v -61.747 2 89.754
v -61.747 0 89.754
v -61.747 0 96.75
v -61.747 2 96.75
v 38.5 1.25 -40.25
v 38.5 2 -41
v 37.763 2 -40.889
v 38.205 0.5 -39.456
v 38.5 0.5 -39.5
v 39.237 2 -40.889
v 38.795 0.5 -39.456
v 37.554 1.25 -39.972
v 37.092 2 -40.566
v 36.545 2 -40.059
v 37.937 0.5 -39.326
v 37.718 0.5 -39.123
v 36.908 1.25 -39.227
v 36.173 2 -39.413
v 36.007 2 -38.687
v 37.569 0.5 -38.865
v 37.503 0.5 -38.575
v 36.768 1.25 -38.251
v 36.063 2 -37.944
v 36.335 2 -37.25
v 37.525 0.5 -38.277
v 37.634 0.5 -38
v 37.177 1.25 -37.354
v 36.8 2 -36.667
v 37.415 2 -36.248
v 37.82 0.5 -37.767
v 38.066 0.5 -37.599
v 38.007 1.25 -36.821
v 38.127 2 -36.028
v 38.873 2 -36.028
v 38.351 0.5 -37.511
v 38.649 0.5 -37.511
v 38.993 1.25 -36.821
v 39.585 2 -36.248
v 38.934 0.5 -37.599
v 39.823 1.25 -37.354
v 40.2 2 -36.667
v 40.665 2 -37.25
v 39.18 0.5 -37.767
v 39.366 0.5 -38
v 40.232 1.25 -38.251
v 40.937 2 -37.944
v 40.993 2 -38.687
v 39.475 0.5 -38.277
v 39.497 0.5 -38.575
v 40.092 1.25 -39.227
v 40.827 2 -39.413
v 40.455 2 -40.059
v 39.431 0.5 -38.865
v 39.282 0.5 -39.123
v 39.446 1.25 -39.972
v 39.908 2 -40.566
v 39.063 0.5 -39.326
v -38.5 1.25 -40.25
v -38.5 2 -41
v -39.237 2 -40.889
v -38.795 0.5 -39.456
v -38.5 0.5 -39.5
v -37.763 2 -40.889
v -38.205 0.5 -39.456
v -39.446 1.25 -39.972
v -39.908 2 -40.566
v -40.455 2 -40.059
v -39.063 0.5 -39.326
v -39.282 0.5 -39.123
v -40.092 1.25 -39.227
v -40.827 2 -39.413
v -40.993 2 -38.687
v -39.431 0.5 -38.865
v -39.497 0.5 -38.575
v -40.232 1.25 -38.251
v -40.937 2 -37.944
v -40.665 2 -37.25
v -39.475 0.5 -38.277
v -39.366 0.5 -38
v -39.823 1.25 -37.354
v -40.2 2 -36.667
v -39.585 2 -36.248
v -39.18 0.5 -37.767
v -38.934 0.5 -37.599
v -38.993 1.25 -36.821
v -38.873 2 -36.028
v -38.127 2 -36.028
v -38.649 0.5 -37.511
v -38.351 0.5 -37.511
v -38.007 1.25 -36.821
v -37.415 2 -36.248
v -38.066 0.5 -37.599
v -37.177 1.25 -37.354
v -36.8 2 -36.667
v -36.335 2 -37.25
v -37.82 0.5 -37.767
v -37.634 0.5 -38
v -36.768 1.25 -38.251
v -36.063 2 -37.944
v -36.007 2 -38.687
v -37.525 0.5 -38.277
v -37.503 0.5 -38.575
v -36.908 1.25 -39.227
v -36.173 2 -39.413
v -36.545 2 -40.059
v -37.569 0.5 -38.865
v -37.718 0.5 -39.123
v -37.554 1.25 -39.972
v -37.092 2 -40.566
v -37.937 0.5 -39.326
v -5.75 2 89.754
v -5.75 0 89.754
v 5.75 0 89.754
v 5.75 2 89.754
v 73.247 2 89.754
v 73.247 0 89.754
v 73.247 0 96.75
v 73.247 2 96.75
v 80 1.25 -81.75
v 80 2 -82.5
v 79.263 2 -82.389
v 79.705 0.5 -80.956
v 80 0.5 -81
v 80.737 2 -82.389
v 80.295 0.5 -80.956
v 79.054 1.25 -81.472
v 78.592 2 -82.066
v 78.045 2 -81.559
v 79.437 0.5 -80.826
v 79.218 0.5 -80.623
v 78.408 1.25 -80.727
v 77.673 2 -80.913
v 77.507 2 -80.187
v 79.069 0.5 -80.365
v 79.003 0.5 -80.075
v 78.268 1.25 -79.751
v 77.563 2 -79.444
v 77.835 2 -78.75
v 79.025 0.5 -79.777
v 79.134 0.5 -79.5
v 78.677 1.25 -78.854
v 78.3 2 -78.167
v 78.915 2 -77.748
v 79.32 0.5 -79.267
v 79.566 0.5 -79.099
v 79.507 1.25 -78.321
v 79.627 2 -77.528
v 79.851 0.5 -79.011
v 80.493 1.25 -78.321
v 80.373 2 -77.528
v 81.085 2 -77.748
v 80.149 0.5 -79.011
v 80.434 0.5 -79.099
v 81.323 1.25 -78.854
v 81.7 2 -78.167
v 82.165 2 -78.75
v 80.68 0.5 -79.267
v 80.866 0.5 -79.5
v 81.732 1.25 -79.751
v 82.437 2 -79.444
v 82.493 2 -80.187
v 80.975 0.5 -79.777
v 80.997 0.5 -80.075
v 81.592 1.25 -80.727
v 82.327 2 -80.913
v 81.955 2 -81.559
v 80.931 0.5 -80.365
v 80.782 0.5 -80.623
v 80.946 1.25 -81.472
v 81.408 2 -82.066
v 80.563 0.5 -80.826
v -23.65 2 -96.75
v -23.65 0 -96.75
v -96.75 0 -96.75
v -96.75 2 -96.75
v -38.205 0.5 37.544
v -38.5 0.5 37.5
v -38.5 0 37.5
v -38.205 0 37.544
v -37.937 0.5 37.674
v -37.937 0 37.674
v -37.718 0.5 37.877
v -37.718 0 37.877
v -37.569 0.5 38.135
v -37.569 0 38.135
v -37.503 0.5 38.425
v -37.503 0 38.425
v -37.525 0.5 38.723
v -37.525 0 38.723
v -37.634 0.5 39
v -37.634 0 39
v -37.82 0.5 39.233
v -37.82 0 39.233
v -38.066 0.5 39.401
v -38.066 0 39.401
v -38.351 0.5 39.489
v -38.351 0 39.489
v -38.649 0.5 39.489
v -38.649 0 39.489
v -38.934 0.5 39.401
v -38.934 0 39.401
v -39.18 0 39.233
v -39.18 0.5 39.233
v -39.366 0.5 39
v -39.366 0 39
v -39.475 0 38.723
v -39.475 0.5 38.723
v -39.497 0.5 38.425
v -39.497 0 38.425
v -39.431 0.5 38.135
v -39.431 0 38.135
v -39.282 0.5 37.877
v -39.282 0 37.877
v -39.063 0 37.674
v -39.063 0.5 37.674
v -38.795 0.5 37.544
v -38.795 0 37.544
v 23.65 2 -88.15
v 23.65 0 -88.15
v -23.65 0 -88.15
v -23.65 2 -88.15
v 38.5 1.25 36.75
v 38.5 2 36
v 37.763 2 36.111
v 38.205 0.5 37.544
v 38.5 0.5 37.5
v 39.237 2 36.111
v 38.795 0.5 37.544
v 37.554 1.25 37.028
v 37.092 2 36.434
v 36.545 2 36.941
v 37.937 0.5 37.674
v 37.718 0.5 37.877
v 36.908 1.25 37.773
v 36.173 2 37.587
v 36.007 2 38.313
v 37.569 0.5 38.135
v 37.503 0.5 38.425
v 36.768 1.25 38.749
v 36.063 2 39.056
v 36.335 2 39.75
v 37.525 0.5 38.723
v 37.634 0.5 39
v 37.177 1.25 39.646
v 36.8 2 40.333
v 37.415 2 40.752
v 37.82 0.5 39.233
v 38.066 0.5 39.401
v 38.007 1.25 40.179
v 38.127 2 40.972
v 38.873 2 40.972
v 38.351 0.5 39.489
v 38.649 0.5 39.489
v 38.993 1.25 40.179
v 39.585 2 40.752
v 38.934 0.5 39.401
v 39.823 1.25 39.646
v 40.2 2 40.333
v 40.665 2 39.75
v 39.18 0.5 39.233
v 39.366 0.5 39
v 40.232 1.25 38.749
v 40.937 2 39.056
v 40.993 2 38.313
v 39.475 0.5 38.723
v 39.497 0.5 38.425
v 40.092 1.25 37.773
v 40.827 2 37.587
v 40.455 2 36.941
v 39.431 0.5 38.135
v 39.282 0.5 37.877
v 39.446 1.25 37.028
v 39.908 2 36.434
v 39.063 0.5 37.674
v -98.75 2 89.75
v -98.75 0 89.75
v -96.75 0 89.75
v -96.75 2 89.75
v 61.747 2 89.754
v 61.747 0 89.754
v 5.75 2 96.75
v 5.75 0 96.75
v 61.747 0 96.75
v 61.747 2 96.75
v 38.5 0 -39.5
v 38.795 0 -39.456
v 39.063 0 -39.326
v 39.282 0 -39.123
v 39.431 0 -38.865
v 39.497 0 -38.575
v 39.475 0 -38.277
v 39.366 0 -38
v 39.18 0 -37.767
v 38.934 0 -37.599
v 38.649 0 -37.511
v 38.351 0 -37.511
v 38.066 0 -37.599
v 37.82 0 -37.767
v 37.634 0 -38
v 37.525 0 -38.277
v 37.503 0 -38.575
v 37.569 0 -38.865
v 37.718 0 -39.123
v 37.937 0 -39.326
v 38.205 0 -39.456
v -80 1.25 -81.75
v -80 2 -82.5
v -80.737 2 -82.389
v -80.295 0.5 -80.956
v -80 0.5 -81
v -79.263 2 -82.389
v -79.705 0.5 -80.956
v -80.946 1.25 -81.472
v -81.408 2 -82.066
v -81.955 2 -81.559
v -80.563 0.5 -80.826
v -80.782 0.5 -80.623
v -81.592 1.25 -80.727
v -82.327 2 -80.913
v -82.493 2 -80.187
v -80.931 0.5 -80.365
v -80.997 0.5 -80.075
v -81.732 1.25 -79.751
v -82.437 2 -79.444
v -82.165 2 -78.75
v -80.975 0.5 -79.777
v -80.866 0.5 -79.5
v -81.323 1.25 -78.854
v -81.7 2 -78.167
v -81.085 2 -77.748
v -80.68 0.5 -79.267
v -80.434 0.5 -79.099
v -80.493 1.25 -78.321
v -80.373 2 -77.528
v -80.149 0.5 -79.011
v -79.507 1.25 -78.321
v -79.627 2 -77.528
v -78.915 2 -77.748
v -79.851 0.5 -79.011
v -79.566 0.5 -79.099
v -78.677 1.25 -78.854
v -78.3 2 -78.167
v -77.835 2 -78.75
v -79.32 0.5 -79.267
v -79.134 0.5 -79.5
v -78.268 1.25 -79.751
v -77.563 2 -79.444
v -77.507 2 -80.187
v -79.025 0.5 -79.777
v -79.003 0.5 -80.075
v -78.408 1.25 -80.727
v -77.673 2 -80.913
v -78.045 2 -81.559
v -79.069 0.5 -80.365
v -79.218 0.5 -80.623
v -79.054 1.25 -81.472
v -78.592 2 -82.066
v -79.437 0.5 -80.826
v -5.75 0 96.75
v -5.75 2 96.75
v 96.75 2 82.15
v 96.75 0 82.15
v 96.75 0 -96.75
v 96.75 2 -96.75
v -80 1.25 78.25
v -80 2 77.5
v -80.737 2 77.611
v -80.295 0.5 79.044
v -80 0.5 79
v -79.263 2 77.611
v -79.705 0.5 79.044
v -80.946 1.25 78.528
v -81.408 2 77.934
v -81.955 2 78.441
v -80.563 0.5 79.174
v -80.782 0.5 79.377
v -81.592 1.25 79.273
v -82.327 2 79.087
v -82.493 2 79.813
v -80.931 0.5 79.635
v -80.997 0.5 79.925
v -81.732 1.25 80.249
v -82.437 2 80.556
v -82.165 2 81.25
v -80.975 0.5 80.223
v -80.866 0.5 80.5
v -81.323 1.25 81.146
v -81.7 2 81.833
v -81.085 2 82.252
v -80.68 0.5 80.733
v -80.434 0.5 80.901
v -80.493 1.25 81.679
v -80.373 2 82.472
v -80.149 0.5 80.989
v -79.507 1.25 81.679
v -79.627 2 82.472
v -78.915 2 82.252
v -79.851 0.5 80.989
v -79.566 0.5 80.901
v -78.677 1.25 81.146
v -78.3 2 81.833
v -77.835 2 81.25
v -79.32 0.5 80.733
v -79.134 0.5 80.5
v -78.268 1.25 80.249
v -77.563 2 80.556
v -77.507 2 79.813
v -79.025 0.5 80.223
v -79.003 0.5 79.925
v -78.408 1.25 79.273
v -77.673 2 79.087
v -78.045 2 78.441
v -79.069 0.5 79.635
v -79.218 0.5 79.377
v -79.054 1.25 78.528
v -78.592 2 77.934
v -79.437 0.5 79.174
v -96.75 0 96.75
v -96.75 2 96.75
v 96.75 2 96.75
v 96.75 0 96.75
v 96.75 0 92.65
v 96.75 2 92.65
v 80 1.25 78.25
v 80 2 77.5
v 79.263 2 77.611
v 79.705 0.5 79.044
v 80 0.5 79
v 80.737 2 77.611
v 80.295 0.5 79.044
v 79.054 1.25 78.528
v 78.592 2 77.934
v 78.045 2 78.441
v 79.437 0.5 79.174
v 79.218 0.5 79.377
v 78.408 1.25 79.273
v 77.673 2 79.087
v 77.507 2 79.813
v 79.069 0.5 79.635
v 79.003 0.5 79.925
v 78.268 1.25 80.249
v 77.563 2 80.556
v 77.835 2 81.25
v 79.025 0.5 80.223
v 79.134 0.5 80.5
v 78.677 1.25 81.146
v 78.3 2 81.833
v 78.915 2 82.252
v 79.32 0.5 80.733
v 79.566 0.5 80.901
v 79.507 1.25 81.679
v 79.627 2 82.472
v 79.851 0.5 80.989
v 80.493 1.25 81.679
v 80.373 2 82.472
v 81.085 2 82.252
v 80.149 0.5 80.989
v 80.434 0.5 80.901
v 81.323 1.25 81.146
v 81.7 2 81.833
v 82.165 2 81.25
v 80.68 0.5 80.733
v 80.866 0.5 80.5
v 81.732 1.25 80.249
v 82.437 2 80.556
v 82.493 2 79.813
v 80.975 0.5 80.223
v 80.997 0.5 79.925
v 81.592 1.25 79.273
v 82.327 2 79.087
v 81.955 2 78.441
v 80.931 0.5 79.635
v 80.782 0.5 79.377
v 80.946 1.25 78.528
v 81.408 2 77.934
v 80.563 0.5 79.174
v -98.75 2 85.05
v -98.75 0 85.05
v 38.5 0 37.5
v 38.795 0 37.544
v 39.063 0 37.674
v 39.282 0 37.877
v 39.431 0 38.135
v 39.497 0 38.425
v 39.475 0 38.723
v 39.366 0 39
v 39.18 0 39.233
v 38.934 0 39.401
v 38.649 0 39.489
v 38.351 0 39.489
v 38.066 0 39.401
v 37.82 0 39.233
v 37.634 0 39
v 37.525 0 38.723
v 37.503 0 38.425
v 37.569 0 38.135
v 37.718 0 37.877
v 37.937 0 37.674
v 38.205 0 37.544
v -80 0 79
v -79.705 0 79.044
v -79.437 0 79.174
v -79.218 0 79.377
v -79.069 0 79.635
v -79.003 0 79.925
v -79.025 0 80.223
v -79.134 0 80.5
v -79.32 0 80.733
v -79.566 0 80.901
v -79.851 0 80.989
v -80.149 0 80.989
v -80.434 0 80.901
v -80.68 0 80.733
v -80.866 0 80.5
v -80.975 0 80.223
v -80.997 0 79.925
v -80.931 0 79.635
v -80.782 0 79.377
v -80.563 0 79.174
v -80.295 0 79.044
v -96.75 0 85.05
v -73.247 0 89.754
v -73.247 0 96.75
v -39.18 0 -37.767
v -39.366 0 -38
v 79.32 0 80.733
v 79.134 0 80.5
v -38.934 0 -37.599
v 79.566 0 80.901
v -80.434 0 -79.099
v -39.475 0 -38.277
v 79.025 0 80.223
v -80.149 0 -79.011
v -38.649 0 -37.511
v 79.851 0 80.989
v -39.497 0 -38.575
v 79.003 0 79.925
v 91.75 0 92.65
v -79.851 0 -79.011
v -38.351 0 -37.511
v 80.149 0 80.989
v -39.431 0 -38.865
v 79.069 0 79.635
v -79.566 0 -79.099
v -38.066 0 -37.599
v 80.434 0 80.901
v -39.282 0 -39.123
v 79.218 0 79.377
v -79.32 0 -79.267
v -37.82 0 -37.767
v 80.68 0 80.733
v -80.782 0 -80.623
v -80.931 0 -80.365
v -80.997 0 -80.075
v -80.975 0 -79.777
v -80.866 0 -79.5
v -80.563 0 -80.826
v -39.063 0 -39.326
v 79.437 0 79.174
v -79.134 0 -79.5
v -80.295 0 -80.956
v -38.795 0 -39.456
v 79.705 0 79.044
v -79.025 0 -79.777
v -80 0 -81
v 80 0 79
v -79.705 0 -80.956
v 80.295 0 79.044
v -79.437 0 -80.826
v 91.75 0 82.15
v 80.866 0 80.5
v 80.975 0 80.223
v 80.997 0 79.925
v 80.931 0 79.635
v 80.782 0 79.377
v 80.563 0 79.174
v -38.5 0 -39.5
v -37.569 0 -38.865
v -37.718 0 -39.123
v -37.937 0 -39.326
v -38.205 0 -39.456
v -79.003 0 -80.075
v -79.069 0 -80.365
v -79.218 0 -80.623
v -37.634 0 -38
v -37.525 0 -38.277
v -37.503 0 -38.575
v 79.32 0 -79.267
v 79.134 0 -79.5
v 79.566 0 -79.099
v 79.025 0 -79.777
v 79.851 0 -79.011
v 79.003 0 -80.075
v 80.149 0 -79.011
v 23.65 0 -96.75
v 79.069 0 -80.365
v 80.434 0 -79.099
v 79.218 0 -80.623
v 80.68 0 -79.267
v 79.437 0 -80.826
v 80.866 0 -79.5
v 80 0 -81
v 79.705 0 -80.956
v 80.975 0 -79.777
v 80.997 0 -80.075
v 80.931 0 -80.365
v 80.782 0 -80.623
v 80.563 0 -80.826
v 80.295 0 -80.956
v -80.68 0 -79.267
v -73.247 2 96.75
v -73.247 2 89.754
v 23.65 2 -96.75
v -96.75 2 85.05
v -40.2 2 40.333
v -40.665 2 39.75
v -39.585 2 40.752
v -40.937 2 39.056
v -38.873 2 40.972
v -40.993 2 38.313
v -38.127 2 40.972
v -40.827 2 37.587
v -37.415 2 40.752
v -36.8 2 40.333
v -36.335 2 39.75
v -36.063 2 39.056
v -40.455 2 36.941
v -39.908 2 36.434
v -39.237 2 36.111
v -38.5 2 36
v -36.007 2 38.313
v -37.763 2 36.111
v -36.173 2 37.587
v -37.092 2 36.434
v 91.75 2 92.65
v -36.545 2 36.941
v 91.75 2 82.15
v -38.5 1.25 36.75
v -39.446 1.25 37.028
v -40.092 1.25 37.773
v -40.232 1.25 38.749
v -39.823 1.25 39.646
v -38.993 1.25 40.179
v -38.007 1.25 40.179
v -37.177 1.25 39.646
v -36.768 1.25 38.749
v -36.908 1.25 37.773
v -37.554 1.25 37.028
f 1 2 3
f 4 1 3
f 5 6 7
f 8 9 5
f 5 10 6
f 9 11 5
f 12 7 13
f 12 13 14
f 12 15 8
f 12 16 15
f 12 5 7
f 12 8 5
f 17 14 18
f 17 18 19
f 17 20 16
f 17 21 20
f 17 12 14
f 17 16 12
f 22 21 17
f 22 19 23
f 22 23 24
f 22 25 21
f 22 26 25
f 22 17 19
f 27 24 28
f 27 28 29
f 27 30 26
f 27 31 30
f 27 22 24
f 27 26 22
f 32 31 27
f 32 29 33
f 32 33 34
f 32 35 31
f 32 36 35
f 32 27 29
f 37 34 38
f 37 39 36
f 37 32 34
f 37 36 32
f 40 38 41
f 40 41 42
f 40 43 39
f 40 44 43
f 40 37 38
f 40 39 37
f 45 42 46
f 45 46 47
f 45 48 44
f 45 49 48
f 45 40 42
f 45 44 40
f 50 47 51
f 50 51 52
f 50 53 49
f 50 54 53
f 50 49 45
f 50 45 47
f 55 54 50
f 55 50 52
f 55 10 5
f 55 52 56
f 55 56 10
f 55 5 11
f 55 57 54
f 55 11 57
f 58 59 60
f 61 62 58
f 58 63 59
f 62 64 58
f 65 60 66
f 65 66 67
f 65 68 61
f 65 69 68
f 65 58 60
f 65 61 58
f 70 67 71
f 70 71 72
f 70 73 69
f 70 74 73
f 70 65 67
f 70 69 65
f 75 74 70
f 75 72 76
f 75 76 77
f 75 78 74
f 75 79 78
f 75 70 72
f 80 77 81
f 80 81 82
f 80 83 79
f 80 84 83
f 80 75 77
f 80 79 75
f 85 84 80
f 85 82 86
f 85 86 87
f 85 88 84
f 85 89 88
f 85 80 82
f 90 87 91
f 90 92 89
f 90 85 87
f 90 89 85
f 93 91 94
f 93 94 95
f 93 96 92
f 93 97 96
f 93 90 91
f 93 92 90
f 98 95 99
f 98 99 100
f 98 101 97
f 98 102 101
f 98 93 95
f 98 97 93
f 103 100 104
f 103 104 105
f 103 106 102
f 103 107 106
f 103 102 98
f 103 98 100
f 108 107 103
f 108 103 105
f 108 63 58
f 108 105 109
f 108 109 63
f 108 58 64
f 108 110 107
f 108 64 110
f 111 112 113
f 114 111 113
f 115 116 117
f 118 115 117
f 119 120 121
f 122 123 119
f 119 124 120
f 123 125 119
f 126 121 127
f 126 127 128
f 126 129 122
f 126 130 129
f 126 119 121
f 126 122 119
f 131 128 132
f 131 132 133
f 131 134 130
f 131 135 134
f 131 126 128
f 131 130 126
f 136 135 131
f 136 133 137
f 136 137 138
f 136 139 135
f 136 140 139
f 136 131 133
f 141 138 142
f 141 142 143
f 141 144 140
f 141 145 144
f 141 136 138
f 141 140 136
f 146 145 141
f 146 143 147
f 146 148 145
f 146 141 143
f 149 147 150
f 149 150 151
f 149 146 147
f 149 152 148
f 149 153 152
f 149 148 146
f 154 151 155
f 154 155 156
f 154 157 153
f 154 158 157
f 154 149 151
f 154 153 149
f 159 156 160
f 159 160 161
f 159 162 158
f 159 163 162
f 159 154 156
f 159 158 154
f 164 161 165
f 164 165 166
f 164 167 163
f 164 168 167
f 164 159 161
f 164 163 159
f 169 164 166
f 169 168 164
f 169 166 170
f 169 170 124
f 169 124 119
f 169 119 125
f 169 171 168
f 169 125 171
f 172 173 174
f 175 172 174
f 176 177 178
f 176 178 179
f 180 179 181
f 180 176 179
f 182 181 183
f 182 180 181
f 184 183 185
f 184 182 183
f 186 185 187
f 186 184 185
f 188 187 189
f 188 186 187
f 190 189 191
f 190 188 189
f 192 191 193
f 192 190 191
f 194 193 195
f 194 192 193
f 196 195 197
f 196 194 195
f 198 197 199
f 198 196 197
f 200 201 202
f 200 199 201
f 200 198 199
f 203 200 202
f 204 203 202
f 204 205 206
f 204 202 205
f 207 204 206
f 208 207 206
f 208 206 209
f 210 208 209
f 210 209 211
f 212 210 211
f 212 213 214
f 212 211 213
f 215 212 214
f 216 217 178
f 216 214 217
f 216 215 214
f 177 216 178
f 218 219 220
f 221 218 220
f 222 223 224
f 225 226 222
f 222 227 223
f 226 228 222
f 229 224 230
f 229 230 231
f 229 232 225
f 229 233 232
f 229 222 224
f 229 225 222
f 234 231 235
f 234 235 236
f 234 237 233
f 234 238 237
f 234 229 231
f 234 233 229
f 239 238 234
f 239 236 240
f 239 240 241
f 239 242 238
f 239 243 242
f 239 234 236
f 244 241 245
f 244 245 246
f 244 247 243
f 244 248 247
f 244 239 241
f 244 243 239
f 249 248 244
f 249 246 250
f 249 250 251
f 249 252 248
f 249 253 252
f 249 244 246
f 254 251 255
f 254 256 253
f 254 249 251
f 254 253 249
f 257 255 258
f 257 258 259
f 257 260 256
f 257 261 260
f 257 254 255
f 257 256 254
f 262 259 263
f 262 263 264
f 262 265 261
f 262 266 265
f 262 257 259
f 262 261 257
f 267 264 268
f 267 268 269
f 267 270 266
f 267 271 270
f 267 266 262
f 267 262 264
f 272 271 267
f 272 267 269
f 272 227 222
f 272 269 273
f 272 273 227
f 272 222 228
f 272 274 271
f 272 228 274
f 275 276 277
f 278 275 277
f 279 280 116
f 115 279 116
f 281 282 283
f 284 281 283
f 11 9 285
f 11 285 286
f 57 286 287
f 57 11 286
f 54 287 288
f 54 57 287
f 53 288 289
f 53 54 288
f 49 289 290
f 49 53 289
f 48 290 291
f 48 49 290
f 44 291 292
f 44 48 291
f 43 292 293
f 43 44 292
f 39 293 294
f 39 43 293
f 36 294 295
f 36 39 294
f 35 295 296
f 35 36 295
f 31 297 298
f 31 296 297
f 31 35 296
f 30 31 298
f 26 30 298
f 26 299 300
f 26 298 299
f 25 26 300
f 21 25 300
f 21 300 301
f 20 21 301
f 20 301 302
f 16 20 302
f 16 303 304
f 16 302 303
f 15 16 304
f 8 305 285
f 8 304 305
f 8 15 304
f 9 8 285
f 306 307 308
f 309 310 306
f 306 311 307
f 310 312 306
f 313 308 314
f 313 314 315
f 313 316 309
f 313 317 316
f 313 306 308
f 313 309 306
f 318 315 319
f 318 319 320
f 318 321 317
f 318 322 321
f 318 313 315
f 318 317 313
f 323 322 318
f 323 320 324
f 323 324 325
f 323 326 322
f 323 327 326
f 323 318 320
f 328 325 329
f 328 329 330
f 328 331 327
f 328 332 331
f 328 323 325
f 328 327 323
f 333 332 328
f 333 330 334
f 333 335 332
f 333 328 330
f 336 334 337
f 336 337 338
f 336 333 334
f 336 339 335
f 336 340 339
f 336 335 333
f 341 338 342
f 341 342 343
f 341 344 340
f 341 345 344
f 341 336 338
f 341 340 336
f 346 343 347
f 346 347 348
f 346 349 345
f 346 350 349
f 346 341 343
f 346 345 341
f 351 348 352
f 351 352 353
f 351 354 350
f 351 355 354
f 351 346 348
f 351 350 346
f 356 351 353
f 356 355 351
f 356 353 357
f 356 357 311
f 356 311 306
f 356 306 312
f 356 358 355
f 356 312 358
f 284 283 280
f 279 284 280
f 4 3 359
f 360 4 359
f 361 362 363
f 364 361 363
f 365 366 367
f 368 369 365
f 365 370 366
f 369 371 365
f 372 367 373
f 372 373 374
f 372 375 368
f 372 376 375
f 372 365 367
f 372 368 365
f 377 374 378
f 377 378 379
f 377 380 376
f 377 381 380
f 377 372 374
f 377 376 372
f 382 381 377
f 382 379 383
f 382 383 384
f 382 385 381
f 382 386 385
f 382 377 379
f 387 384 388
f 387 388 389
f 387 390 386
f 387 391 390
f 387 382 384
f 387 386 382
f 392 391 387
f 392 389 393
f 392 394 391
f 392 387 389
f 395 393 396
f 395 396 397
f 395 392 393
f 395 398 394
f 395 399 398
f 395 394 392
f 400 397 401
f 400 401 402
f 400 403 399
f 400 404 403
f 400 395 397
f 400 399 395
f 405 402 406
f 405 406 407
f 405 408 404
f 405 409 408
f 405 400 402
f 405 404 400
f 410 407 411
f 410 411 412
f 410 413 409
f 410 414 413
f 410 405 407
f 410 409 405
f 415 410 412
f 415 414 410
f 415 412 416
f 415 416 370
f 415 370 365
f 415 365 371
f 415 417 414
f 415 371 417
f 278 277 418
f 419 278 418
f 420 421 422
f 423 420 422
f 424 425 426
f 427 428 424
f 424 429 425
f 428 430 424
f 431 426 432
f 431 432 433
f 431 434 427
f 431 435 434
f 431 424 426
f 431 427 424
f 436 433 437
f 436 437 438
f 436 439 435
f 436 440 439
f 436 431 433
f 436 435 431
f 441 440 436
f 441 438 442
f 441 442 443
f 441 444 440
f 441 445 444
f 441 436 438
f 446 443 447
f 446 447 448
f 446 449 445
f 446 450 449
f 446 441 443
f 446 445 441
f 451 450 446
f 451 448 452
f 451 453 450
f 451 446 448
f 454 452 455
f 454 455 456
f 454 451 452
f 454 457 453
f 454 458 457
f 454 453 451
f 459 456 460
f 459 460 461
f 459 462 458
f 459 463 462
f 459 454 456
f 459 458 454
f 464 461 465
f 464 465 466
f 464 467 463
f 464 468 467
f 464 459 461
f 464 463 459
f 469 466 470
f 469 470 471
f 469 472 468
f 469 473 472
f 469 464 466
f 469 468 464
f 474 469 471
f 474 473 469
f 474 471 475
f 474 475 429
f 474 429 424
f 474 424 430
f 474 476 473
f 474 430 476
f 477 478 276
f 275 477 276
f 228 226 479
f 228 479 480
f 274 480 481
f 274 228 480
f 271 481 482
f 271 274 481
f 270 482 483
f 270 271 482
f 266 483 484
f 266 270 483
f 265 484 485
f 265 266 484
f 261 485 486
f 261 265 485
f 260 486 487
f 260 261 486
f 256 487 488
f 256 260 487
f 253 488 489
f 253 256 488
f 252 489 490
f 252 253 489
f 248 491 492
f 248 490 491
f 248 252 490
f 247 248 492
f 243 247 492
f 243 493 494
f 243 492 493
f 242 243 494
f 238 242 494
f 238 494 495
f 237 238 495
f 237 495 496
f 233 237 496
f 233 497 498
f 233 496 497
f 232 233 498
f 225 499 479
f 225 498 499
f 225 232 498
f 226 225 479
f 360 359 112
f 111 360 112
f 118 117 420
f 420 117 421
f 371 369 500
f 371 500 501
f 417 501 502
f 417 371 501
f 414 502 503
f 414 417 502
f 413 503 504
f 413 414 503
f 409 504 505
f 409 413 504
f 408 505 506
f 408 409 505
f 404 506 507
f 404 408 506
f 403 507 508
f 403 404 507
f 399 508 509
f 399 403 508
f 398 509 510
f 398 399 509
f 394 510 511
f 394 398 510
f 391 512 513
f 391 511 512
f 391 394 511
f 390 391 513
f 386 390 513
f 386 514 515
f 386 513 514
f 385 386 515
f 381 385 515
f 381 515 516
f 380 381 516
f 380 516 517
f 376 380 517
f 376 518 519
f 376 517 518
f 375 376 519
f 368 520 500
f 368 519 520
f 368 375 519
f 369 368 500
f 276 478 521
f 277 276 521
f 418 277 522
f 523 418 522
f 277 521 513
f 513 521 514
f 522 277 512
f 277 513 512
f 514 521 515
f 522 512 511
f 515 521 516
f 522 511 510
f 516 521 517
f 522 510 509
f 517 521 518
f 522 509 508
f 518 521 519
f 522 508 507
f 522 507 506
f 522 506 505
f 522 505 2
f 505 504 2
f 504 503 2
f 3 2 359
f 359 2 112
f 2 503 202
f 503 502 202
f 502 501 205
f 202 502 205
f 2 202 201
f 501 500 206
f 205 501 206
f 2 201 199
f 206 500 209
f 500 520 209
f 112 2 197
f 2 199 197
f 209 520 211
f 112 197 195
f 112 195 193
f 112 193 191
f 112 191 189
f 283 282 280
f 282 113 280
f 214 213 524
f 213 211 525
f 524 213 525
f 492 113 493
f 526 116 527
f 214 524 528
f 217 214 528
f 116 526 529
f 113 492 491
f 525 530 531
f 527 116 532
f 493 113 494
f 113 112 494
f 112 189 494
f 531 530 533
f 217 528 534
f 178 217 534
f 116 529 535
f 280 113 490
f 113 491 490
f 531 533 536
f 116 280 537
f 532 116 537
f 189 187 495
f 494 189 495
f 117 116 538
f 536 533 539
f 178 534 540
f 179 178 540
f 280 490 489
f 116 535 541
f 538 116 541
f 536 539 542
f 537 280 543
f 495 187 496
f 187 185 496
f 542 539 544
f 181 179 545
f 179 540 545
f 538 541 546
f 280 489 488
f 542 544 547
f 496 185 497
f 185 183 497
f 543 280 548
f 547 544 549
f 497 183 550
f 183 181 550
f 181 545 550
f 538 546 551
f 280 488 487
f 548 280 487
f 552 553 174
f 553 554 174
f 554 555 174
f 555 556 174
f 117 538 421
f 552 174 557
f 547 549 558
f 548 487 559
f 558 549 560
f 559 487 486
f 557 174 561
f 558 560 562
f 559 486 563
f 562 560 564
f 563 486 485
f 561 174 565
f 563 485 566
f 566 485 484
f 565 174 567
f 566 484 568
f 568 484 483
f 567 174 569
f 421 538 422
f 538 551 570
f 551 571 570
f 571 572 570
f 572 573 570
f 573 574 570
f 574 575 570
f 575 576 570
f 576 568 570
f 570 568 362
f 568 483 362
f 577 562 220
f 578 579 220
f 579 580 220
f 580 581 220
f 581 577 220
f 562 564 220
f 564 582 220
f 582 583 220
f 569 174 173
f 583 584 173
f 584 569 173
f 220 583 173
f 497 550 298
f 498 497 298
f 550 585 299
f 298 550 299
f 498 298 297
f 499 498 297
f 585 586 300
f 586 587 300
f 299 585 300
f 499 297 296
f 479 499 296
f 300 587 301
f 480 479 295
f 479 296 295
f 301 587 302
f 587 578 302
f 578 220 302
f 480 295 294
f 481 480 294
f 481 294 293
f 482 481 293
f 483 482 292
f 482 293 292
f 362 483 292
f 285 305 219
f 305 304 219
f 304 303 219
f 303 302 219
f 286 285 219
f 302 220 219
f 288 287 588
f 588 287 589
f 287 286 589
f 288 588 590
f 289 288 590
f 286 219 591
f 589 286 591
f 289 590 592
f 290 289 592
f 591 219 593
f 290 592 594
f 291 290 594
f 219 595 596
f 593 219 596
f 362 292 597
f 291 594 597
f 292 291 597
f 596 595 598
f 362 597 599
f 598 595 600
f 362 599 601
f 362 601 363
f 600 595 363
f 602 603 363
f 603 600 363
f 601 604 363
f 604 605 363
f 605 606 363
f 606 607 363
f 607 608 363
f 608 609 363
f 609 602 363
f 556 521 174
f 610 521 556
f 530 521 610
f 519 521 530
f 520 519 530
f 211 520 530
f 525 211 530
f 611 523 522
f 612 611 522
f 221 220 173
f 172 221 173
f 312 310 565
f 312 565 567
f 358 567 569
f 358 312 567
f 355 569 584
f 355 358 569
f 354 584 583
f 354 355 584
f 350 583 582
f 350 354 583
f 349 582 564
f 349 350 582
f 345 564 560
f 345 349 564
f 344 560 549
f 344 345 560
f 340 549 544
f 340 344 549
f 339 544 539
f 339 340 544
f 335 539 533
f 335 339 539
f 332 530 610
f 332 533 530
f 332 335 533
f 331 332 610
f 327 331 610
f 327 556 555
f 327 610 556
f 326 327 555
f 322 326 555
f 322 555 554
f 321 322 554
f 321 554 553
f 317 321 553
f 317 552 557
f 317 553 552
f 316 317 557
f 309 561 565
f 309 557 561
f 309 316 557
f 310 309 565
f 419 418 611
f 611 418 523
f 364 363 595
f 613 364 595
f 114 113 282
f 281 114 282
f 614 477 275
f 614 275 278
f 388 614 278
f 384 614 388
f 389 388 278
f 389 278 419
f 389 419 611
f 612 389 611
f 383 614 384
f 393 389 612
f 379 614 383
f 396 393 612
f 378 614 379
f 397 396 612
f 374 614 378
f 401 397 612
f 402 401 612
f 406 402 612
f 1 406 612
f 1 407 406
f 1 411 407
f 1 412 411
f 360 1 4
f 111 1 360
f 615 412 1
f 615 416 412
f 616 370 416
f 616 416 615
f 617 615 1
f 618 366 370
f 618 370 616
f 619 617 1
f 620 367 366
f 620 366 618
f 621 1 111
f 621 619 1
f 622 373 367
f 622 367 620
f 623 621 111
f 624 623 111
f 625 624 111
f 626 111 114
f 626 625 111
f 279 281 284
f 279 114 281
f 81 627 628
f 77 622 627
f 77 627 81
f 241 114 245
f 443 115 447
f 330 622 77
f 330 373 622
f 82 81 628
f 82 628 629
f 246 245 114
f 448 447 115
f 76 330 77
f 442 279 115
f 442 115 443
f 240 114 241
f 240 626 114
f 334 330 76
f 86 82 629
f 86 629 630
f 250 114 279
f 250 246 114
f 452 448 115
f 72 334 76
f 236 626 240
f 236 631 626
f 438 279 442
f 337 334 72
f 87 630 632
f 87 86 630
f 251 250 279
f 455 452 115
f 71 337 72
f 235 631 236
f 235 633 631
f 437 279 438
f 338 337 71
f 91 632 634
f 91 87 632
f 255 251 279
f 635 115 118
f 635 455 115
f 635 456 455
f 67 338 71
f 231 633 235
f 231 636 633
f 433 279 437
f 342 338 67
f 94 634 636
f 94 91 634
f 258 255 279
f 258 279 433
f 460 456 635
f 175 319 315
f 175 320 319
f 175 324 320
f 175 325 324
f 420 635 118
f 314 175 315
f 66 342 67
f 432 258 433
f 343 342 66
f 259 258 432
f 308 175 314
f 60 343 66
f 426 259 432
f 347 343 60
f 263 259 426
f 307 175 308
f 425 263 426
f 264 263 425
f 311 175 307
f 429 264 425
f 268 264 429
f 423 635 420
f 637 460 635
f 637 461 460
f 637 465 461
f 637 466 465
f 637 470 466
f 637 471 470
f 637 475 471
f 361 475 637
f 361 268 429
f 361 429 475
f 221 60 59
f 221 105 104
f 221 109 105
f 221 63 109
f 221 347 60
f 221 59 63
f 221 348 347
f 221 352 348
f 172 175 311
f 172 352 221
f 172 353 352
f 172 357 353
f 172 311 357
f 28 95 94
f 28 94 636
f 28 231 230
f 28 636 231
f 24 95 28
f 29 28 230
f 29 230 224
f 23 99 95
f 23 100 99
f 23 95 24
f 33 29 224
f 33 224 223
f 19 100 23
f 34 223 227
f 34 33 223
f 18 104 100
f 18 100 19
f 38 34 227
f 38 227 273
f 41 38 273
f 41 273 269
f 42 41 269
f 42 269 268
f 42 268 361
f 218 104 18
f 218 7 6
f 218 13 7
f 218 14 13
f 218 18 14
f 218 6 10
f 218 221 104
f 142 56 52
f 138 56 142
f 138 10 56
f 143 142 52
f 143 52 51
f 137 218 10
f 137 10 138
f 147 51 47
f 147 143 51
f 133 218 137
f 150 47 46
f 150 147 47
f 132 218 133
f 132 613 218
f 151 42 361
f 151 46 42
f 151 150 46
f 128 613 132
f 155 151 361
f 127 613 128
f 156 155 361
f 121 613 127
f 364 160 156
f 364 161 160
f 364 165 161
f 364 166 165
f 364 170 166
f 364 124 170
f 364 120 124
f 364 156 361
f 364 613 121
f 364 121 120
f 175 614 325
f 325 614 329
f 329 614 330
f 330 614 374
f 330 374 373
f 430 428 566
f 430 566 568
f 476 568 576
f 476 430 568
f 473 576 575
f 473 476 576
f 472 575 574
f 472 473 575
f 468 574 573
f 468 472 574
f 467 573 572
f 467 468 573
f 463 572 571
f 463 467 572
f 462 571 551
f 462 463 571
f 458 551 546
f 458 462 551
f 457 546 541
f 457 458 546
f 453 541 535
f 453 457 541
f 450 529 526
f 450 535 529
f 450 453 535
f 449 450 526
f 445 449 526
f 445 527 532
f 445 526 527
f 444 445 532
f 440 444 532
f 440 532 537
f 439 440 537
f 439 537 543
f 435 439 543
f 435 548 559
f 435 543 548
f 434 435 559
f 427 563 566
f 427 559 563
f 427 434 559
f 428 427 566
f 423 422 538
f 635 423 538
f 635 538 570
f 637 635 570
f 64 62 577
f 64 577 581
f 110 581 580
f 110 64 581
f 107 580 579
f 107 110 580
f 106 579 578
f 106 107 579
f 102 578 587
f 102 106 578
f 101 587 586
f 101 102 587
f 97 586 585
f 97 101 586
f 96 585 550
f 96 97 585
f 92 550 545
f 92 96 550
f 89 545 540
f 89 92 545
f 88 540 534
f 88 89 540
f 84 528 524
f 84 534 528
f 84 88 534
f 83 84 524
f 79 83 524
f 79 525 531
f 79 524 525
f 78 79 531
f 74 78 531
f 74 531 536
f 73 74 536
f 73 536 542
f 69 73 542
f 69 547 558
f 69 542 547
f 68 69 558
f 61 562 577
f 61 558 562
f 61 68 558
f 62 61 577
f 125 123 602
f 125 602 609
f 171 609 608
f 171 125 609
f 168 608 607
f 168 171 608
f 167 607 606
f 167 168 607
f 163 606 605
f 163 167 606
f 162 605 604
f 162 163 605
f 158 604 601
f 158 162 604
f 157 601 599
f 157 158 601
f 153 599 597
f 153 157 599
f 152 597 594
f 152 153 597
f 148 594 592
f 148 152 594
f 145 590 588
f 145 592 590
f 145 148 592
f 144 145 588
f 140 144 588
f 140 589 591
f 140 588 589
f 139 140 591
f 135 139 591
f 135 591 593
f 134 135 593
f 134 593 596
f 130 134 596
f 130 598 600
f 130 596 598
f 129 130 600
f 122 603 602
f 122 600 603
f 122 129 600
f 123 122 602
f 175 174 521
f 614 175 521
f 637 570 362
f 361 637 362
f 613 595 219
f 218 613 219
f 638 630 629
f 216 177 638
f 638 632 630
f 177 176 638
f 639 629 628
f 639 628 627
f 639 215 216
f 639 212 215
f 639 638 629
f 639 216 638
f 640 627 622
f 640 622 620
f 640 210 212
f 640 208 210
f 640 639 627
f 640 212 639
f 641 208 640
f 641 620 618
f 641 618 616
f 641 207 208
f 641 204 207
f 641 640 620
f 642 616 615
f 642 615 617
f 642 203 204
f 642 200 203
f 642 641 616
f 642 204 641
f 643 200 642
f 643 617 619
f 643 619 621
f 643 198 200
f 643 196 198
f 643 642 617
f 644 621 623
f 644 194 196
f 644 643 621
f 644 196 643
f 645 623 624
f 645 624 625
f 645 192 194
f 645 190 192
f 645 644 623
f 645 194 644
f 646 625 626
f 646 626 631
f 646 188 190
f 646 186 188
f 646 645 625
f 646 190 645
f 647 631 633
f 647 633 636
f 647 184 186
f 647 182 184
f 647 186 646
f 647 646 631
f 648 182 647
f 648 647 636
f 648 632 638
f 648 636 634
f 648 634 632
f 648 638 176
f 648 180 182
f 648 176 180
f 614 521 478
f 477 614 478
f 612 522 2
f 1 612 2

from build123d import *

# Parameters (mm, degrees)
BOSS_EXTRUDE1_DEPTH     = 2
CUT_EXTRUDE1_DEPTH      = 139.261075506
CUT_EXTRUDE1_DEPTH_BACK = 139.261075506
SKETCH2_R               = 1
CHAMFER1_SIZE           = 1.5


with BuildPart() as part:
    # Sketch1 → Boss-Extrude1 (new body)
    with BuildSketch(Plane(origin=(0, 0, 0), x_dir=(1, 0, 0), z_dir=(0, 1, 0))):
        Polygon((5.75, -96.75), (61.746519787, -96.75), (61.746519787, -89.753578842), (73.246519787, -89.753578842), (73.246519787, -96.75), (96.75, -96.75), (96.75, -92.65), (91.75, -92.65), (91.75, -82.15), (96.75, -82.15), (96.75, 96.75), (23.65, 96.75), (23.65, 88.15), (-23.65, 88.15), (-23.65, 96.75), (-96.75, 96.75), (-96.75, -85.05), (-98.75, -85.05), (-98.75, -89.75), (-96.75, -89.75), (-96.75, -96.75), (-73.246519787, -96.75), (-73.246519787, -89.753578842), (-61.746519787, -89.753578842), (-61.746519787, -96.75), (-5.75, -96.75), (-5.75, -89.753578842), (5.75, -89.753578842), align=None)
    extrude(amount=BOSS_EXTRUDE1_DEPTH)

    # Sketch2 → Cut-Extrude1 (cut, two sides: drawn at the far end of the back side and taken through both)
    with BuildSketch(Plane.XZ.offset(-CUT_EXTRUDE1_DEPTH_BACK)):
        with Locations(Location((80, 80, 0), (0, 0, 270))):
            Circle(SKETCH2_R)
        with Locations(Location((-80, 80, 0), (0, 0, 270))):
            Circle(SKETCH2_R)
        with Locations(Location((-38.5, 38.5, 0), (0, 0, 270))):
            Circle(SKETCH2_R)
        with Locations(Location((38.5, 38.5, 0), (0, 0, 270))):
            Circle(SKETCH2_R)
        with Locations(Location((80, -80, 0), (0, 0, 270))):
            Circle(SKETCH2_R)
        with Locations(Location((-80, -80, 0), (0, 0, 270))):
            Circle(SKETCH2_R)
        with Locations(Location((38.5, -38.5, 0), (0, 0, 270))):
            Circle(SKETCH2_R)
        with Locations(Location((-38.5, -38.5, 0), (0, 0, 270))):
            Circle(SKETCH2_R)
    extrude(amount=CUT_EXTRUDE1_DEPTH + CUT_EXTRUDE1_DEPTH_BACK, mode=Mode.SUBTRACT)

    # Chamfer1
    chamfer1_edges = [part.edges().sort_by_distance(p)[0] for p in [
        (-80, 2, 81),
        (-38.5, 2, 39.5),
        (38.5, 2, 39.5),
        (80, 2, -79),
        (-38.5, 2, -37.5),
        (38.5, 2, -37.5),
        (-80, 2, -79),
        (80, 2, 81),
    ]]
    chamfer(chamfer1_edges, length=CHAMFER1_SIZE)


solid = part.part
